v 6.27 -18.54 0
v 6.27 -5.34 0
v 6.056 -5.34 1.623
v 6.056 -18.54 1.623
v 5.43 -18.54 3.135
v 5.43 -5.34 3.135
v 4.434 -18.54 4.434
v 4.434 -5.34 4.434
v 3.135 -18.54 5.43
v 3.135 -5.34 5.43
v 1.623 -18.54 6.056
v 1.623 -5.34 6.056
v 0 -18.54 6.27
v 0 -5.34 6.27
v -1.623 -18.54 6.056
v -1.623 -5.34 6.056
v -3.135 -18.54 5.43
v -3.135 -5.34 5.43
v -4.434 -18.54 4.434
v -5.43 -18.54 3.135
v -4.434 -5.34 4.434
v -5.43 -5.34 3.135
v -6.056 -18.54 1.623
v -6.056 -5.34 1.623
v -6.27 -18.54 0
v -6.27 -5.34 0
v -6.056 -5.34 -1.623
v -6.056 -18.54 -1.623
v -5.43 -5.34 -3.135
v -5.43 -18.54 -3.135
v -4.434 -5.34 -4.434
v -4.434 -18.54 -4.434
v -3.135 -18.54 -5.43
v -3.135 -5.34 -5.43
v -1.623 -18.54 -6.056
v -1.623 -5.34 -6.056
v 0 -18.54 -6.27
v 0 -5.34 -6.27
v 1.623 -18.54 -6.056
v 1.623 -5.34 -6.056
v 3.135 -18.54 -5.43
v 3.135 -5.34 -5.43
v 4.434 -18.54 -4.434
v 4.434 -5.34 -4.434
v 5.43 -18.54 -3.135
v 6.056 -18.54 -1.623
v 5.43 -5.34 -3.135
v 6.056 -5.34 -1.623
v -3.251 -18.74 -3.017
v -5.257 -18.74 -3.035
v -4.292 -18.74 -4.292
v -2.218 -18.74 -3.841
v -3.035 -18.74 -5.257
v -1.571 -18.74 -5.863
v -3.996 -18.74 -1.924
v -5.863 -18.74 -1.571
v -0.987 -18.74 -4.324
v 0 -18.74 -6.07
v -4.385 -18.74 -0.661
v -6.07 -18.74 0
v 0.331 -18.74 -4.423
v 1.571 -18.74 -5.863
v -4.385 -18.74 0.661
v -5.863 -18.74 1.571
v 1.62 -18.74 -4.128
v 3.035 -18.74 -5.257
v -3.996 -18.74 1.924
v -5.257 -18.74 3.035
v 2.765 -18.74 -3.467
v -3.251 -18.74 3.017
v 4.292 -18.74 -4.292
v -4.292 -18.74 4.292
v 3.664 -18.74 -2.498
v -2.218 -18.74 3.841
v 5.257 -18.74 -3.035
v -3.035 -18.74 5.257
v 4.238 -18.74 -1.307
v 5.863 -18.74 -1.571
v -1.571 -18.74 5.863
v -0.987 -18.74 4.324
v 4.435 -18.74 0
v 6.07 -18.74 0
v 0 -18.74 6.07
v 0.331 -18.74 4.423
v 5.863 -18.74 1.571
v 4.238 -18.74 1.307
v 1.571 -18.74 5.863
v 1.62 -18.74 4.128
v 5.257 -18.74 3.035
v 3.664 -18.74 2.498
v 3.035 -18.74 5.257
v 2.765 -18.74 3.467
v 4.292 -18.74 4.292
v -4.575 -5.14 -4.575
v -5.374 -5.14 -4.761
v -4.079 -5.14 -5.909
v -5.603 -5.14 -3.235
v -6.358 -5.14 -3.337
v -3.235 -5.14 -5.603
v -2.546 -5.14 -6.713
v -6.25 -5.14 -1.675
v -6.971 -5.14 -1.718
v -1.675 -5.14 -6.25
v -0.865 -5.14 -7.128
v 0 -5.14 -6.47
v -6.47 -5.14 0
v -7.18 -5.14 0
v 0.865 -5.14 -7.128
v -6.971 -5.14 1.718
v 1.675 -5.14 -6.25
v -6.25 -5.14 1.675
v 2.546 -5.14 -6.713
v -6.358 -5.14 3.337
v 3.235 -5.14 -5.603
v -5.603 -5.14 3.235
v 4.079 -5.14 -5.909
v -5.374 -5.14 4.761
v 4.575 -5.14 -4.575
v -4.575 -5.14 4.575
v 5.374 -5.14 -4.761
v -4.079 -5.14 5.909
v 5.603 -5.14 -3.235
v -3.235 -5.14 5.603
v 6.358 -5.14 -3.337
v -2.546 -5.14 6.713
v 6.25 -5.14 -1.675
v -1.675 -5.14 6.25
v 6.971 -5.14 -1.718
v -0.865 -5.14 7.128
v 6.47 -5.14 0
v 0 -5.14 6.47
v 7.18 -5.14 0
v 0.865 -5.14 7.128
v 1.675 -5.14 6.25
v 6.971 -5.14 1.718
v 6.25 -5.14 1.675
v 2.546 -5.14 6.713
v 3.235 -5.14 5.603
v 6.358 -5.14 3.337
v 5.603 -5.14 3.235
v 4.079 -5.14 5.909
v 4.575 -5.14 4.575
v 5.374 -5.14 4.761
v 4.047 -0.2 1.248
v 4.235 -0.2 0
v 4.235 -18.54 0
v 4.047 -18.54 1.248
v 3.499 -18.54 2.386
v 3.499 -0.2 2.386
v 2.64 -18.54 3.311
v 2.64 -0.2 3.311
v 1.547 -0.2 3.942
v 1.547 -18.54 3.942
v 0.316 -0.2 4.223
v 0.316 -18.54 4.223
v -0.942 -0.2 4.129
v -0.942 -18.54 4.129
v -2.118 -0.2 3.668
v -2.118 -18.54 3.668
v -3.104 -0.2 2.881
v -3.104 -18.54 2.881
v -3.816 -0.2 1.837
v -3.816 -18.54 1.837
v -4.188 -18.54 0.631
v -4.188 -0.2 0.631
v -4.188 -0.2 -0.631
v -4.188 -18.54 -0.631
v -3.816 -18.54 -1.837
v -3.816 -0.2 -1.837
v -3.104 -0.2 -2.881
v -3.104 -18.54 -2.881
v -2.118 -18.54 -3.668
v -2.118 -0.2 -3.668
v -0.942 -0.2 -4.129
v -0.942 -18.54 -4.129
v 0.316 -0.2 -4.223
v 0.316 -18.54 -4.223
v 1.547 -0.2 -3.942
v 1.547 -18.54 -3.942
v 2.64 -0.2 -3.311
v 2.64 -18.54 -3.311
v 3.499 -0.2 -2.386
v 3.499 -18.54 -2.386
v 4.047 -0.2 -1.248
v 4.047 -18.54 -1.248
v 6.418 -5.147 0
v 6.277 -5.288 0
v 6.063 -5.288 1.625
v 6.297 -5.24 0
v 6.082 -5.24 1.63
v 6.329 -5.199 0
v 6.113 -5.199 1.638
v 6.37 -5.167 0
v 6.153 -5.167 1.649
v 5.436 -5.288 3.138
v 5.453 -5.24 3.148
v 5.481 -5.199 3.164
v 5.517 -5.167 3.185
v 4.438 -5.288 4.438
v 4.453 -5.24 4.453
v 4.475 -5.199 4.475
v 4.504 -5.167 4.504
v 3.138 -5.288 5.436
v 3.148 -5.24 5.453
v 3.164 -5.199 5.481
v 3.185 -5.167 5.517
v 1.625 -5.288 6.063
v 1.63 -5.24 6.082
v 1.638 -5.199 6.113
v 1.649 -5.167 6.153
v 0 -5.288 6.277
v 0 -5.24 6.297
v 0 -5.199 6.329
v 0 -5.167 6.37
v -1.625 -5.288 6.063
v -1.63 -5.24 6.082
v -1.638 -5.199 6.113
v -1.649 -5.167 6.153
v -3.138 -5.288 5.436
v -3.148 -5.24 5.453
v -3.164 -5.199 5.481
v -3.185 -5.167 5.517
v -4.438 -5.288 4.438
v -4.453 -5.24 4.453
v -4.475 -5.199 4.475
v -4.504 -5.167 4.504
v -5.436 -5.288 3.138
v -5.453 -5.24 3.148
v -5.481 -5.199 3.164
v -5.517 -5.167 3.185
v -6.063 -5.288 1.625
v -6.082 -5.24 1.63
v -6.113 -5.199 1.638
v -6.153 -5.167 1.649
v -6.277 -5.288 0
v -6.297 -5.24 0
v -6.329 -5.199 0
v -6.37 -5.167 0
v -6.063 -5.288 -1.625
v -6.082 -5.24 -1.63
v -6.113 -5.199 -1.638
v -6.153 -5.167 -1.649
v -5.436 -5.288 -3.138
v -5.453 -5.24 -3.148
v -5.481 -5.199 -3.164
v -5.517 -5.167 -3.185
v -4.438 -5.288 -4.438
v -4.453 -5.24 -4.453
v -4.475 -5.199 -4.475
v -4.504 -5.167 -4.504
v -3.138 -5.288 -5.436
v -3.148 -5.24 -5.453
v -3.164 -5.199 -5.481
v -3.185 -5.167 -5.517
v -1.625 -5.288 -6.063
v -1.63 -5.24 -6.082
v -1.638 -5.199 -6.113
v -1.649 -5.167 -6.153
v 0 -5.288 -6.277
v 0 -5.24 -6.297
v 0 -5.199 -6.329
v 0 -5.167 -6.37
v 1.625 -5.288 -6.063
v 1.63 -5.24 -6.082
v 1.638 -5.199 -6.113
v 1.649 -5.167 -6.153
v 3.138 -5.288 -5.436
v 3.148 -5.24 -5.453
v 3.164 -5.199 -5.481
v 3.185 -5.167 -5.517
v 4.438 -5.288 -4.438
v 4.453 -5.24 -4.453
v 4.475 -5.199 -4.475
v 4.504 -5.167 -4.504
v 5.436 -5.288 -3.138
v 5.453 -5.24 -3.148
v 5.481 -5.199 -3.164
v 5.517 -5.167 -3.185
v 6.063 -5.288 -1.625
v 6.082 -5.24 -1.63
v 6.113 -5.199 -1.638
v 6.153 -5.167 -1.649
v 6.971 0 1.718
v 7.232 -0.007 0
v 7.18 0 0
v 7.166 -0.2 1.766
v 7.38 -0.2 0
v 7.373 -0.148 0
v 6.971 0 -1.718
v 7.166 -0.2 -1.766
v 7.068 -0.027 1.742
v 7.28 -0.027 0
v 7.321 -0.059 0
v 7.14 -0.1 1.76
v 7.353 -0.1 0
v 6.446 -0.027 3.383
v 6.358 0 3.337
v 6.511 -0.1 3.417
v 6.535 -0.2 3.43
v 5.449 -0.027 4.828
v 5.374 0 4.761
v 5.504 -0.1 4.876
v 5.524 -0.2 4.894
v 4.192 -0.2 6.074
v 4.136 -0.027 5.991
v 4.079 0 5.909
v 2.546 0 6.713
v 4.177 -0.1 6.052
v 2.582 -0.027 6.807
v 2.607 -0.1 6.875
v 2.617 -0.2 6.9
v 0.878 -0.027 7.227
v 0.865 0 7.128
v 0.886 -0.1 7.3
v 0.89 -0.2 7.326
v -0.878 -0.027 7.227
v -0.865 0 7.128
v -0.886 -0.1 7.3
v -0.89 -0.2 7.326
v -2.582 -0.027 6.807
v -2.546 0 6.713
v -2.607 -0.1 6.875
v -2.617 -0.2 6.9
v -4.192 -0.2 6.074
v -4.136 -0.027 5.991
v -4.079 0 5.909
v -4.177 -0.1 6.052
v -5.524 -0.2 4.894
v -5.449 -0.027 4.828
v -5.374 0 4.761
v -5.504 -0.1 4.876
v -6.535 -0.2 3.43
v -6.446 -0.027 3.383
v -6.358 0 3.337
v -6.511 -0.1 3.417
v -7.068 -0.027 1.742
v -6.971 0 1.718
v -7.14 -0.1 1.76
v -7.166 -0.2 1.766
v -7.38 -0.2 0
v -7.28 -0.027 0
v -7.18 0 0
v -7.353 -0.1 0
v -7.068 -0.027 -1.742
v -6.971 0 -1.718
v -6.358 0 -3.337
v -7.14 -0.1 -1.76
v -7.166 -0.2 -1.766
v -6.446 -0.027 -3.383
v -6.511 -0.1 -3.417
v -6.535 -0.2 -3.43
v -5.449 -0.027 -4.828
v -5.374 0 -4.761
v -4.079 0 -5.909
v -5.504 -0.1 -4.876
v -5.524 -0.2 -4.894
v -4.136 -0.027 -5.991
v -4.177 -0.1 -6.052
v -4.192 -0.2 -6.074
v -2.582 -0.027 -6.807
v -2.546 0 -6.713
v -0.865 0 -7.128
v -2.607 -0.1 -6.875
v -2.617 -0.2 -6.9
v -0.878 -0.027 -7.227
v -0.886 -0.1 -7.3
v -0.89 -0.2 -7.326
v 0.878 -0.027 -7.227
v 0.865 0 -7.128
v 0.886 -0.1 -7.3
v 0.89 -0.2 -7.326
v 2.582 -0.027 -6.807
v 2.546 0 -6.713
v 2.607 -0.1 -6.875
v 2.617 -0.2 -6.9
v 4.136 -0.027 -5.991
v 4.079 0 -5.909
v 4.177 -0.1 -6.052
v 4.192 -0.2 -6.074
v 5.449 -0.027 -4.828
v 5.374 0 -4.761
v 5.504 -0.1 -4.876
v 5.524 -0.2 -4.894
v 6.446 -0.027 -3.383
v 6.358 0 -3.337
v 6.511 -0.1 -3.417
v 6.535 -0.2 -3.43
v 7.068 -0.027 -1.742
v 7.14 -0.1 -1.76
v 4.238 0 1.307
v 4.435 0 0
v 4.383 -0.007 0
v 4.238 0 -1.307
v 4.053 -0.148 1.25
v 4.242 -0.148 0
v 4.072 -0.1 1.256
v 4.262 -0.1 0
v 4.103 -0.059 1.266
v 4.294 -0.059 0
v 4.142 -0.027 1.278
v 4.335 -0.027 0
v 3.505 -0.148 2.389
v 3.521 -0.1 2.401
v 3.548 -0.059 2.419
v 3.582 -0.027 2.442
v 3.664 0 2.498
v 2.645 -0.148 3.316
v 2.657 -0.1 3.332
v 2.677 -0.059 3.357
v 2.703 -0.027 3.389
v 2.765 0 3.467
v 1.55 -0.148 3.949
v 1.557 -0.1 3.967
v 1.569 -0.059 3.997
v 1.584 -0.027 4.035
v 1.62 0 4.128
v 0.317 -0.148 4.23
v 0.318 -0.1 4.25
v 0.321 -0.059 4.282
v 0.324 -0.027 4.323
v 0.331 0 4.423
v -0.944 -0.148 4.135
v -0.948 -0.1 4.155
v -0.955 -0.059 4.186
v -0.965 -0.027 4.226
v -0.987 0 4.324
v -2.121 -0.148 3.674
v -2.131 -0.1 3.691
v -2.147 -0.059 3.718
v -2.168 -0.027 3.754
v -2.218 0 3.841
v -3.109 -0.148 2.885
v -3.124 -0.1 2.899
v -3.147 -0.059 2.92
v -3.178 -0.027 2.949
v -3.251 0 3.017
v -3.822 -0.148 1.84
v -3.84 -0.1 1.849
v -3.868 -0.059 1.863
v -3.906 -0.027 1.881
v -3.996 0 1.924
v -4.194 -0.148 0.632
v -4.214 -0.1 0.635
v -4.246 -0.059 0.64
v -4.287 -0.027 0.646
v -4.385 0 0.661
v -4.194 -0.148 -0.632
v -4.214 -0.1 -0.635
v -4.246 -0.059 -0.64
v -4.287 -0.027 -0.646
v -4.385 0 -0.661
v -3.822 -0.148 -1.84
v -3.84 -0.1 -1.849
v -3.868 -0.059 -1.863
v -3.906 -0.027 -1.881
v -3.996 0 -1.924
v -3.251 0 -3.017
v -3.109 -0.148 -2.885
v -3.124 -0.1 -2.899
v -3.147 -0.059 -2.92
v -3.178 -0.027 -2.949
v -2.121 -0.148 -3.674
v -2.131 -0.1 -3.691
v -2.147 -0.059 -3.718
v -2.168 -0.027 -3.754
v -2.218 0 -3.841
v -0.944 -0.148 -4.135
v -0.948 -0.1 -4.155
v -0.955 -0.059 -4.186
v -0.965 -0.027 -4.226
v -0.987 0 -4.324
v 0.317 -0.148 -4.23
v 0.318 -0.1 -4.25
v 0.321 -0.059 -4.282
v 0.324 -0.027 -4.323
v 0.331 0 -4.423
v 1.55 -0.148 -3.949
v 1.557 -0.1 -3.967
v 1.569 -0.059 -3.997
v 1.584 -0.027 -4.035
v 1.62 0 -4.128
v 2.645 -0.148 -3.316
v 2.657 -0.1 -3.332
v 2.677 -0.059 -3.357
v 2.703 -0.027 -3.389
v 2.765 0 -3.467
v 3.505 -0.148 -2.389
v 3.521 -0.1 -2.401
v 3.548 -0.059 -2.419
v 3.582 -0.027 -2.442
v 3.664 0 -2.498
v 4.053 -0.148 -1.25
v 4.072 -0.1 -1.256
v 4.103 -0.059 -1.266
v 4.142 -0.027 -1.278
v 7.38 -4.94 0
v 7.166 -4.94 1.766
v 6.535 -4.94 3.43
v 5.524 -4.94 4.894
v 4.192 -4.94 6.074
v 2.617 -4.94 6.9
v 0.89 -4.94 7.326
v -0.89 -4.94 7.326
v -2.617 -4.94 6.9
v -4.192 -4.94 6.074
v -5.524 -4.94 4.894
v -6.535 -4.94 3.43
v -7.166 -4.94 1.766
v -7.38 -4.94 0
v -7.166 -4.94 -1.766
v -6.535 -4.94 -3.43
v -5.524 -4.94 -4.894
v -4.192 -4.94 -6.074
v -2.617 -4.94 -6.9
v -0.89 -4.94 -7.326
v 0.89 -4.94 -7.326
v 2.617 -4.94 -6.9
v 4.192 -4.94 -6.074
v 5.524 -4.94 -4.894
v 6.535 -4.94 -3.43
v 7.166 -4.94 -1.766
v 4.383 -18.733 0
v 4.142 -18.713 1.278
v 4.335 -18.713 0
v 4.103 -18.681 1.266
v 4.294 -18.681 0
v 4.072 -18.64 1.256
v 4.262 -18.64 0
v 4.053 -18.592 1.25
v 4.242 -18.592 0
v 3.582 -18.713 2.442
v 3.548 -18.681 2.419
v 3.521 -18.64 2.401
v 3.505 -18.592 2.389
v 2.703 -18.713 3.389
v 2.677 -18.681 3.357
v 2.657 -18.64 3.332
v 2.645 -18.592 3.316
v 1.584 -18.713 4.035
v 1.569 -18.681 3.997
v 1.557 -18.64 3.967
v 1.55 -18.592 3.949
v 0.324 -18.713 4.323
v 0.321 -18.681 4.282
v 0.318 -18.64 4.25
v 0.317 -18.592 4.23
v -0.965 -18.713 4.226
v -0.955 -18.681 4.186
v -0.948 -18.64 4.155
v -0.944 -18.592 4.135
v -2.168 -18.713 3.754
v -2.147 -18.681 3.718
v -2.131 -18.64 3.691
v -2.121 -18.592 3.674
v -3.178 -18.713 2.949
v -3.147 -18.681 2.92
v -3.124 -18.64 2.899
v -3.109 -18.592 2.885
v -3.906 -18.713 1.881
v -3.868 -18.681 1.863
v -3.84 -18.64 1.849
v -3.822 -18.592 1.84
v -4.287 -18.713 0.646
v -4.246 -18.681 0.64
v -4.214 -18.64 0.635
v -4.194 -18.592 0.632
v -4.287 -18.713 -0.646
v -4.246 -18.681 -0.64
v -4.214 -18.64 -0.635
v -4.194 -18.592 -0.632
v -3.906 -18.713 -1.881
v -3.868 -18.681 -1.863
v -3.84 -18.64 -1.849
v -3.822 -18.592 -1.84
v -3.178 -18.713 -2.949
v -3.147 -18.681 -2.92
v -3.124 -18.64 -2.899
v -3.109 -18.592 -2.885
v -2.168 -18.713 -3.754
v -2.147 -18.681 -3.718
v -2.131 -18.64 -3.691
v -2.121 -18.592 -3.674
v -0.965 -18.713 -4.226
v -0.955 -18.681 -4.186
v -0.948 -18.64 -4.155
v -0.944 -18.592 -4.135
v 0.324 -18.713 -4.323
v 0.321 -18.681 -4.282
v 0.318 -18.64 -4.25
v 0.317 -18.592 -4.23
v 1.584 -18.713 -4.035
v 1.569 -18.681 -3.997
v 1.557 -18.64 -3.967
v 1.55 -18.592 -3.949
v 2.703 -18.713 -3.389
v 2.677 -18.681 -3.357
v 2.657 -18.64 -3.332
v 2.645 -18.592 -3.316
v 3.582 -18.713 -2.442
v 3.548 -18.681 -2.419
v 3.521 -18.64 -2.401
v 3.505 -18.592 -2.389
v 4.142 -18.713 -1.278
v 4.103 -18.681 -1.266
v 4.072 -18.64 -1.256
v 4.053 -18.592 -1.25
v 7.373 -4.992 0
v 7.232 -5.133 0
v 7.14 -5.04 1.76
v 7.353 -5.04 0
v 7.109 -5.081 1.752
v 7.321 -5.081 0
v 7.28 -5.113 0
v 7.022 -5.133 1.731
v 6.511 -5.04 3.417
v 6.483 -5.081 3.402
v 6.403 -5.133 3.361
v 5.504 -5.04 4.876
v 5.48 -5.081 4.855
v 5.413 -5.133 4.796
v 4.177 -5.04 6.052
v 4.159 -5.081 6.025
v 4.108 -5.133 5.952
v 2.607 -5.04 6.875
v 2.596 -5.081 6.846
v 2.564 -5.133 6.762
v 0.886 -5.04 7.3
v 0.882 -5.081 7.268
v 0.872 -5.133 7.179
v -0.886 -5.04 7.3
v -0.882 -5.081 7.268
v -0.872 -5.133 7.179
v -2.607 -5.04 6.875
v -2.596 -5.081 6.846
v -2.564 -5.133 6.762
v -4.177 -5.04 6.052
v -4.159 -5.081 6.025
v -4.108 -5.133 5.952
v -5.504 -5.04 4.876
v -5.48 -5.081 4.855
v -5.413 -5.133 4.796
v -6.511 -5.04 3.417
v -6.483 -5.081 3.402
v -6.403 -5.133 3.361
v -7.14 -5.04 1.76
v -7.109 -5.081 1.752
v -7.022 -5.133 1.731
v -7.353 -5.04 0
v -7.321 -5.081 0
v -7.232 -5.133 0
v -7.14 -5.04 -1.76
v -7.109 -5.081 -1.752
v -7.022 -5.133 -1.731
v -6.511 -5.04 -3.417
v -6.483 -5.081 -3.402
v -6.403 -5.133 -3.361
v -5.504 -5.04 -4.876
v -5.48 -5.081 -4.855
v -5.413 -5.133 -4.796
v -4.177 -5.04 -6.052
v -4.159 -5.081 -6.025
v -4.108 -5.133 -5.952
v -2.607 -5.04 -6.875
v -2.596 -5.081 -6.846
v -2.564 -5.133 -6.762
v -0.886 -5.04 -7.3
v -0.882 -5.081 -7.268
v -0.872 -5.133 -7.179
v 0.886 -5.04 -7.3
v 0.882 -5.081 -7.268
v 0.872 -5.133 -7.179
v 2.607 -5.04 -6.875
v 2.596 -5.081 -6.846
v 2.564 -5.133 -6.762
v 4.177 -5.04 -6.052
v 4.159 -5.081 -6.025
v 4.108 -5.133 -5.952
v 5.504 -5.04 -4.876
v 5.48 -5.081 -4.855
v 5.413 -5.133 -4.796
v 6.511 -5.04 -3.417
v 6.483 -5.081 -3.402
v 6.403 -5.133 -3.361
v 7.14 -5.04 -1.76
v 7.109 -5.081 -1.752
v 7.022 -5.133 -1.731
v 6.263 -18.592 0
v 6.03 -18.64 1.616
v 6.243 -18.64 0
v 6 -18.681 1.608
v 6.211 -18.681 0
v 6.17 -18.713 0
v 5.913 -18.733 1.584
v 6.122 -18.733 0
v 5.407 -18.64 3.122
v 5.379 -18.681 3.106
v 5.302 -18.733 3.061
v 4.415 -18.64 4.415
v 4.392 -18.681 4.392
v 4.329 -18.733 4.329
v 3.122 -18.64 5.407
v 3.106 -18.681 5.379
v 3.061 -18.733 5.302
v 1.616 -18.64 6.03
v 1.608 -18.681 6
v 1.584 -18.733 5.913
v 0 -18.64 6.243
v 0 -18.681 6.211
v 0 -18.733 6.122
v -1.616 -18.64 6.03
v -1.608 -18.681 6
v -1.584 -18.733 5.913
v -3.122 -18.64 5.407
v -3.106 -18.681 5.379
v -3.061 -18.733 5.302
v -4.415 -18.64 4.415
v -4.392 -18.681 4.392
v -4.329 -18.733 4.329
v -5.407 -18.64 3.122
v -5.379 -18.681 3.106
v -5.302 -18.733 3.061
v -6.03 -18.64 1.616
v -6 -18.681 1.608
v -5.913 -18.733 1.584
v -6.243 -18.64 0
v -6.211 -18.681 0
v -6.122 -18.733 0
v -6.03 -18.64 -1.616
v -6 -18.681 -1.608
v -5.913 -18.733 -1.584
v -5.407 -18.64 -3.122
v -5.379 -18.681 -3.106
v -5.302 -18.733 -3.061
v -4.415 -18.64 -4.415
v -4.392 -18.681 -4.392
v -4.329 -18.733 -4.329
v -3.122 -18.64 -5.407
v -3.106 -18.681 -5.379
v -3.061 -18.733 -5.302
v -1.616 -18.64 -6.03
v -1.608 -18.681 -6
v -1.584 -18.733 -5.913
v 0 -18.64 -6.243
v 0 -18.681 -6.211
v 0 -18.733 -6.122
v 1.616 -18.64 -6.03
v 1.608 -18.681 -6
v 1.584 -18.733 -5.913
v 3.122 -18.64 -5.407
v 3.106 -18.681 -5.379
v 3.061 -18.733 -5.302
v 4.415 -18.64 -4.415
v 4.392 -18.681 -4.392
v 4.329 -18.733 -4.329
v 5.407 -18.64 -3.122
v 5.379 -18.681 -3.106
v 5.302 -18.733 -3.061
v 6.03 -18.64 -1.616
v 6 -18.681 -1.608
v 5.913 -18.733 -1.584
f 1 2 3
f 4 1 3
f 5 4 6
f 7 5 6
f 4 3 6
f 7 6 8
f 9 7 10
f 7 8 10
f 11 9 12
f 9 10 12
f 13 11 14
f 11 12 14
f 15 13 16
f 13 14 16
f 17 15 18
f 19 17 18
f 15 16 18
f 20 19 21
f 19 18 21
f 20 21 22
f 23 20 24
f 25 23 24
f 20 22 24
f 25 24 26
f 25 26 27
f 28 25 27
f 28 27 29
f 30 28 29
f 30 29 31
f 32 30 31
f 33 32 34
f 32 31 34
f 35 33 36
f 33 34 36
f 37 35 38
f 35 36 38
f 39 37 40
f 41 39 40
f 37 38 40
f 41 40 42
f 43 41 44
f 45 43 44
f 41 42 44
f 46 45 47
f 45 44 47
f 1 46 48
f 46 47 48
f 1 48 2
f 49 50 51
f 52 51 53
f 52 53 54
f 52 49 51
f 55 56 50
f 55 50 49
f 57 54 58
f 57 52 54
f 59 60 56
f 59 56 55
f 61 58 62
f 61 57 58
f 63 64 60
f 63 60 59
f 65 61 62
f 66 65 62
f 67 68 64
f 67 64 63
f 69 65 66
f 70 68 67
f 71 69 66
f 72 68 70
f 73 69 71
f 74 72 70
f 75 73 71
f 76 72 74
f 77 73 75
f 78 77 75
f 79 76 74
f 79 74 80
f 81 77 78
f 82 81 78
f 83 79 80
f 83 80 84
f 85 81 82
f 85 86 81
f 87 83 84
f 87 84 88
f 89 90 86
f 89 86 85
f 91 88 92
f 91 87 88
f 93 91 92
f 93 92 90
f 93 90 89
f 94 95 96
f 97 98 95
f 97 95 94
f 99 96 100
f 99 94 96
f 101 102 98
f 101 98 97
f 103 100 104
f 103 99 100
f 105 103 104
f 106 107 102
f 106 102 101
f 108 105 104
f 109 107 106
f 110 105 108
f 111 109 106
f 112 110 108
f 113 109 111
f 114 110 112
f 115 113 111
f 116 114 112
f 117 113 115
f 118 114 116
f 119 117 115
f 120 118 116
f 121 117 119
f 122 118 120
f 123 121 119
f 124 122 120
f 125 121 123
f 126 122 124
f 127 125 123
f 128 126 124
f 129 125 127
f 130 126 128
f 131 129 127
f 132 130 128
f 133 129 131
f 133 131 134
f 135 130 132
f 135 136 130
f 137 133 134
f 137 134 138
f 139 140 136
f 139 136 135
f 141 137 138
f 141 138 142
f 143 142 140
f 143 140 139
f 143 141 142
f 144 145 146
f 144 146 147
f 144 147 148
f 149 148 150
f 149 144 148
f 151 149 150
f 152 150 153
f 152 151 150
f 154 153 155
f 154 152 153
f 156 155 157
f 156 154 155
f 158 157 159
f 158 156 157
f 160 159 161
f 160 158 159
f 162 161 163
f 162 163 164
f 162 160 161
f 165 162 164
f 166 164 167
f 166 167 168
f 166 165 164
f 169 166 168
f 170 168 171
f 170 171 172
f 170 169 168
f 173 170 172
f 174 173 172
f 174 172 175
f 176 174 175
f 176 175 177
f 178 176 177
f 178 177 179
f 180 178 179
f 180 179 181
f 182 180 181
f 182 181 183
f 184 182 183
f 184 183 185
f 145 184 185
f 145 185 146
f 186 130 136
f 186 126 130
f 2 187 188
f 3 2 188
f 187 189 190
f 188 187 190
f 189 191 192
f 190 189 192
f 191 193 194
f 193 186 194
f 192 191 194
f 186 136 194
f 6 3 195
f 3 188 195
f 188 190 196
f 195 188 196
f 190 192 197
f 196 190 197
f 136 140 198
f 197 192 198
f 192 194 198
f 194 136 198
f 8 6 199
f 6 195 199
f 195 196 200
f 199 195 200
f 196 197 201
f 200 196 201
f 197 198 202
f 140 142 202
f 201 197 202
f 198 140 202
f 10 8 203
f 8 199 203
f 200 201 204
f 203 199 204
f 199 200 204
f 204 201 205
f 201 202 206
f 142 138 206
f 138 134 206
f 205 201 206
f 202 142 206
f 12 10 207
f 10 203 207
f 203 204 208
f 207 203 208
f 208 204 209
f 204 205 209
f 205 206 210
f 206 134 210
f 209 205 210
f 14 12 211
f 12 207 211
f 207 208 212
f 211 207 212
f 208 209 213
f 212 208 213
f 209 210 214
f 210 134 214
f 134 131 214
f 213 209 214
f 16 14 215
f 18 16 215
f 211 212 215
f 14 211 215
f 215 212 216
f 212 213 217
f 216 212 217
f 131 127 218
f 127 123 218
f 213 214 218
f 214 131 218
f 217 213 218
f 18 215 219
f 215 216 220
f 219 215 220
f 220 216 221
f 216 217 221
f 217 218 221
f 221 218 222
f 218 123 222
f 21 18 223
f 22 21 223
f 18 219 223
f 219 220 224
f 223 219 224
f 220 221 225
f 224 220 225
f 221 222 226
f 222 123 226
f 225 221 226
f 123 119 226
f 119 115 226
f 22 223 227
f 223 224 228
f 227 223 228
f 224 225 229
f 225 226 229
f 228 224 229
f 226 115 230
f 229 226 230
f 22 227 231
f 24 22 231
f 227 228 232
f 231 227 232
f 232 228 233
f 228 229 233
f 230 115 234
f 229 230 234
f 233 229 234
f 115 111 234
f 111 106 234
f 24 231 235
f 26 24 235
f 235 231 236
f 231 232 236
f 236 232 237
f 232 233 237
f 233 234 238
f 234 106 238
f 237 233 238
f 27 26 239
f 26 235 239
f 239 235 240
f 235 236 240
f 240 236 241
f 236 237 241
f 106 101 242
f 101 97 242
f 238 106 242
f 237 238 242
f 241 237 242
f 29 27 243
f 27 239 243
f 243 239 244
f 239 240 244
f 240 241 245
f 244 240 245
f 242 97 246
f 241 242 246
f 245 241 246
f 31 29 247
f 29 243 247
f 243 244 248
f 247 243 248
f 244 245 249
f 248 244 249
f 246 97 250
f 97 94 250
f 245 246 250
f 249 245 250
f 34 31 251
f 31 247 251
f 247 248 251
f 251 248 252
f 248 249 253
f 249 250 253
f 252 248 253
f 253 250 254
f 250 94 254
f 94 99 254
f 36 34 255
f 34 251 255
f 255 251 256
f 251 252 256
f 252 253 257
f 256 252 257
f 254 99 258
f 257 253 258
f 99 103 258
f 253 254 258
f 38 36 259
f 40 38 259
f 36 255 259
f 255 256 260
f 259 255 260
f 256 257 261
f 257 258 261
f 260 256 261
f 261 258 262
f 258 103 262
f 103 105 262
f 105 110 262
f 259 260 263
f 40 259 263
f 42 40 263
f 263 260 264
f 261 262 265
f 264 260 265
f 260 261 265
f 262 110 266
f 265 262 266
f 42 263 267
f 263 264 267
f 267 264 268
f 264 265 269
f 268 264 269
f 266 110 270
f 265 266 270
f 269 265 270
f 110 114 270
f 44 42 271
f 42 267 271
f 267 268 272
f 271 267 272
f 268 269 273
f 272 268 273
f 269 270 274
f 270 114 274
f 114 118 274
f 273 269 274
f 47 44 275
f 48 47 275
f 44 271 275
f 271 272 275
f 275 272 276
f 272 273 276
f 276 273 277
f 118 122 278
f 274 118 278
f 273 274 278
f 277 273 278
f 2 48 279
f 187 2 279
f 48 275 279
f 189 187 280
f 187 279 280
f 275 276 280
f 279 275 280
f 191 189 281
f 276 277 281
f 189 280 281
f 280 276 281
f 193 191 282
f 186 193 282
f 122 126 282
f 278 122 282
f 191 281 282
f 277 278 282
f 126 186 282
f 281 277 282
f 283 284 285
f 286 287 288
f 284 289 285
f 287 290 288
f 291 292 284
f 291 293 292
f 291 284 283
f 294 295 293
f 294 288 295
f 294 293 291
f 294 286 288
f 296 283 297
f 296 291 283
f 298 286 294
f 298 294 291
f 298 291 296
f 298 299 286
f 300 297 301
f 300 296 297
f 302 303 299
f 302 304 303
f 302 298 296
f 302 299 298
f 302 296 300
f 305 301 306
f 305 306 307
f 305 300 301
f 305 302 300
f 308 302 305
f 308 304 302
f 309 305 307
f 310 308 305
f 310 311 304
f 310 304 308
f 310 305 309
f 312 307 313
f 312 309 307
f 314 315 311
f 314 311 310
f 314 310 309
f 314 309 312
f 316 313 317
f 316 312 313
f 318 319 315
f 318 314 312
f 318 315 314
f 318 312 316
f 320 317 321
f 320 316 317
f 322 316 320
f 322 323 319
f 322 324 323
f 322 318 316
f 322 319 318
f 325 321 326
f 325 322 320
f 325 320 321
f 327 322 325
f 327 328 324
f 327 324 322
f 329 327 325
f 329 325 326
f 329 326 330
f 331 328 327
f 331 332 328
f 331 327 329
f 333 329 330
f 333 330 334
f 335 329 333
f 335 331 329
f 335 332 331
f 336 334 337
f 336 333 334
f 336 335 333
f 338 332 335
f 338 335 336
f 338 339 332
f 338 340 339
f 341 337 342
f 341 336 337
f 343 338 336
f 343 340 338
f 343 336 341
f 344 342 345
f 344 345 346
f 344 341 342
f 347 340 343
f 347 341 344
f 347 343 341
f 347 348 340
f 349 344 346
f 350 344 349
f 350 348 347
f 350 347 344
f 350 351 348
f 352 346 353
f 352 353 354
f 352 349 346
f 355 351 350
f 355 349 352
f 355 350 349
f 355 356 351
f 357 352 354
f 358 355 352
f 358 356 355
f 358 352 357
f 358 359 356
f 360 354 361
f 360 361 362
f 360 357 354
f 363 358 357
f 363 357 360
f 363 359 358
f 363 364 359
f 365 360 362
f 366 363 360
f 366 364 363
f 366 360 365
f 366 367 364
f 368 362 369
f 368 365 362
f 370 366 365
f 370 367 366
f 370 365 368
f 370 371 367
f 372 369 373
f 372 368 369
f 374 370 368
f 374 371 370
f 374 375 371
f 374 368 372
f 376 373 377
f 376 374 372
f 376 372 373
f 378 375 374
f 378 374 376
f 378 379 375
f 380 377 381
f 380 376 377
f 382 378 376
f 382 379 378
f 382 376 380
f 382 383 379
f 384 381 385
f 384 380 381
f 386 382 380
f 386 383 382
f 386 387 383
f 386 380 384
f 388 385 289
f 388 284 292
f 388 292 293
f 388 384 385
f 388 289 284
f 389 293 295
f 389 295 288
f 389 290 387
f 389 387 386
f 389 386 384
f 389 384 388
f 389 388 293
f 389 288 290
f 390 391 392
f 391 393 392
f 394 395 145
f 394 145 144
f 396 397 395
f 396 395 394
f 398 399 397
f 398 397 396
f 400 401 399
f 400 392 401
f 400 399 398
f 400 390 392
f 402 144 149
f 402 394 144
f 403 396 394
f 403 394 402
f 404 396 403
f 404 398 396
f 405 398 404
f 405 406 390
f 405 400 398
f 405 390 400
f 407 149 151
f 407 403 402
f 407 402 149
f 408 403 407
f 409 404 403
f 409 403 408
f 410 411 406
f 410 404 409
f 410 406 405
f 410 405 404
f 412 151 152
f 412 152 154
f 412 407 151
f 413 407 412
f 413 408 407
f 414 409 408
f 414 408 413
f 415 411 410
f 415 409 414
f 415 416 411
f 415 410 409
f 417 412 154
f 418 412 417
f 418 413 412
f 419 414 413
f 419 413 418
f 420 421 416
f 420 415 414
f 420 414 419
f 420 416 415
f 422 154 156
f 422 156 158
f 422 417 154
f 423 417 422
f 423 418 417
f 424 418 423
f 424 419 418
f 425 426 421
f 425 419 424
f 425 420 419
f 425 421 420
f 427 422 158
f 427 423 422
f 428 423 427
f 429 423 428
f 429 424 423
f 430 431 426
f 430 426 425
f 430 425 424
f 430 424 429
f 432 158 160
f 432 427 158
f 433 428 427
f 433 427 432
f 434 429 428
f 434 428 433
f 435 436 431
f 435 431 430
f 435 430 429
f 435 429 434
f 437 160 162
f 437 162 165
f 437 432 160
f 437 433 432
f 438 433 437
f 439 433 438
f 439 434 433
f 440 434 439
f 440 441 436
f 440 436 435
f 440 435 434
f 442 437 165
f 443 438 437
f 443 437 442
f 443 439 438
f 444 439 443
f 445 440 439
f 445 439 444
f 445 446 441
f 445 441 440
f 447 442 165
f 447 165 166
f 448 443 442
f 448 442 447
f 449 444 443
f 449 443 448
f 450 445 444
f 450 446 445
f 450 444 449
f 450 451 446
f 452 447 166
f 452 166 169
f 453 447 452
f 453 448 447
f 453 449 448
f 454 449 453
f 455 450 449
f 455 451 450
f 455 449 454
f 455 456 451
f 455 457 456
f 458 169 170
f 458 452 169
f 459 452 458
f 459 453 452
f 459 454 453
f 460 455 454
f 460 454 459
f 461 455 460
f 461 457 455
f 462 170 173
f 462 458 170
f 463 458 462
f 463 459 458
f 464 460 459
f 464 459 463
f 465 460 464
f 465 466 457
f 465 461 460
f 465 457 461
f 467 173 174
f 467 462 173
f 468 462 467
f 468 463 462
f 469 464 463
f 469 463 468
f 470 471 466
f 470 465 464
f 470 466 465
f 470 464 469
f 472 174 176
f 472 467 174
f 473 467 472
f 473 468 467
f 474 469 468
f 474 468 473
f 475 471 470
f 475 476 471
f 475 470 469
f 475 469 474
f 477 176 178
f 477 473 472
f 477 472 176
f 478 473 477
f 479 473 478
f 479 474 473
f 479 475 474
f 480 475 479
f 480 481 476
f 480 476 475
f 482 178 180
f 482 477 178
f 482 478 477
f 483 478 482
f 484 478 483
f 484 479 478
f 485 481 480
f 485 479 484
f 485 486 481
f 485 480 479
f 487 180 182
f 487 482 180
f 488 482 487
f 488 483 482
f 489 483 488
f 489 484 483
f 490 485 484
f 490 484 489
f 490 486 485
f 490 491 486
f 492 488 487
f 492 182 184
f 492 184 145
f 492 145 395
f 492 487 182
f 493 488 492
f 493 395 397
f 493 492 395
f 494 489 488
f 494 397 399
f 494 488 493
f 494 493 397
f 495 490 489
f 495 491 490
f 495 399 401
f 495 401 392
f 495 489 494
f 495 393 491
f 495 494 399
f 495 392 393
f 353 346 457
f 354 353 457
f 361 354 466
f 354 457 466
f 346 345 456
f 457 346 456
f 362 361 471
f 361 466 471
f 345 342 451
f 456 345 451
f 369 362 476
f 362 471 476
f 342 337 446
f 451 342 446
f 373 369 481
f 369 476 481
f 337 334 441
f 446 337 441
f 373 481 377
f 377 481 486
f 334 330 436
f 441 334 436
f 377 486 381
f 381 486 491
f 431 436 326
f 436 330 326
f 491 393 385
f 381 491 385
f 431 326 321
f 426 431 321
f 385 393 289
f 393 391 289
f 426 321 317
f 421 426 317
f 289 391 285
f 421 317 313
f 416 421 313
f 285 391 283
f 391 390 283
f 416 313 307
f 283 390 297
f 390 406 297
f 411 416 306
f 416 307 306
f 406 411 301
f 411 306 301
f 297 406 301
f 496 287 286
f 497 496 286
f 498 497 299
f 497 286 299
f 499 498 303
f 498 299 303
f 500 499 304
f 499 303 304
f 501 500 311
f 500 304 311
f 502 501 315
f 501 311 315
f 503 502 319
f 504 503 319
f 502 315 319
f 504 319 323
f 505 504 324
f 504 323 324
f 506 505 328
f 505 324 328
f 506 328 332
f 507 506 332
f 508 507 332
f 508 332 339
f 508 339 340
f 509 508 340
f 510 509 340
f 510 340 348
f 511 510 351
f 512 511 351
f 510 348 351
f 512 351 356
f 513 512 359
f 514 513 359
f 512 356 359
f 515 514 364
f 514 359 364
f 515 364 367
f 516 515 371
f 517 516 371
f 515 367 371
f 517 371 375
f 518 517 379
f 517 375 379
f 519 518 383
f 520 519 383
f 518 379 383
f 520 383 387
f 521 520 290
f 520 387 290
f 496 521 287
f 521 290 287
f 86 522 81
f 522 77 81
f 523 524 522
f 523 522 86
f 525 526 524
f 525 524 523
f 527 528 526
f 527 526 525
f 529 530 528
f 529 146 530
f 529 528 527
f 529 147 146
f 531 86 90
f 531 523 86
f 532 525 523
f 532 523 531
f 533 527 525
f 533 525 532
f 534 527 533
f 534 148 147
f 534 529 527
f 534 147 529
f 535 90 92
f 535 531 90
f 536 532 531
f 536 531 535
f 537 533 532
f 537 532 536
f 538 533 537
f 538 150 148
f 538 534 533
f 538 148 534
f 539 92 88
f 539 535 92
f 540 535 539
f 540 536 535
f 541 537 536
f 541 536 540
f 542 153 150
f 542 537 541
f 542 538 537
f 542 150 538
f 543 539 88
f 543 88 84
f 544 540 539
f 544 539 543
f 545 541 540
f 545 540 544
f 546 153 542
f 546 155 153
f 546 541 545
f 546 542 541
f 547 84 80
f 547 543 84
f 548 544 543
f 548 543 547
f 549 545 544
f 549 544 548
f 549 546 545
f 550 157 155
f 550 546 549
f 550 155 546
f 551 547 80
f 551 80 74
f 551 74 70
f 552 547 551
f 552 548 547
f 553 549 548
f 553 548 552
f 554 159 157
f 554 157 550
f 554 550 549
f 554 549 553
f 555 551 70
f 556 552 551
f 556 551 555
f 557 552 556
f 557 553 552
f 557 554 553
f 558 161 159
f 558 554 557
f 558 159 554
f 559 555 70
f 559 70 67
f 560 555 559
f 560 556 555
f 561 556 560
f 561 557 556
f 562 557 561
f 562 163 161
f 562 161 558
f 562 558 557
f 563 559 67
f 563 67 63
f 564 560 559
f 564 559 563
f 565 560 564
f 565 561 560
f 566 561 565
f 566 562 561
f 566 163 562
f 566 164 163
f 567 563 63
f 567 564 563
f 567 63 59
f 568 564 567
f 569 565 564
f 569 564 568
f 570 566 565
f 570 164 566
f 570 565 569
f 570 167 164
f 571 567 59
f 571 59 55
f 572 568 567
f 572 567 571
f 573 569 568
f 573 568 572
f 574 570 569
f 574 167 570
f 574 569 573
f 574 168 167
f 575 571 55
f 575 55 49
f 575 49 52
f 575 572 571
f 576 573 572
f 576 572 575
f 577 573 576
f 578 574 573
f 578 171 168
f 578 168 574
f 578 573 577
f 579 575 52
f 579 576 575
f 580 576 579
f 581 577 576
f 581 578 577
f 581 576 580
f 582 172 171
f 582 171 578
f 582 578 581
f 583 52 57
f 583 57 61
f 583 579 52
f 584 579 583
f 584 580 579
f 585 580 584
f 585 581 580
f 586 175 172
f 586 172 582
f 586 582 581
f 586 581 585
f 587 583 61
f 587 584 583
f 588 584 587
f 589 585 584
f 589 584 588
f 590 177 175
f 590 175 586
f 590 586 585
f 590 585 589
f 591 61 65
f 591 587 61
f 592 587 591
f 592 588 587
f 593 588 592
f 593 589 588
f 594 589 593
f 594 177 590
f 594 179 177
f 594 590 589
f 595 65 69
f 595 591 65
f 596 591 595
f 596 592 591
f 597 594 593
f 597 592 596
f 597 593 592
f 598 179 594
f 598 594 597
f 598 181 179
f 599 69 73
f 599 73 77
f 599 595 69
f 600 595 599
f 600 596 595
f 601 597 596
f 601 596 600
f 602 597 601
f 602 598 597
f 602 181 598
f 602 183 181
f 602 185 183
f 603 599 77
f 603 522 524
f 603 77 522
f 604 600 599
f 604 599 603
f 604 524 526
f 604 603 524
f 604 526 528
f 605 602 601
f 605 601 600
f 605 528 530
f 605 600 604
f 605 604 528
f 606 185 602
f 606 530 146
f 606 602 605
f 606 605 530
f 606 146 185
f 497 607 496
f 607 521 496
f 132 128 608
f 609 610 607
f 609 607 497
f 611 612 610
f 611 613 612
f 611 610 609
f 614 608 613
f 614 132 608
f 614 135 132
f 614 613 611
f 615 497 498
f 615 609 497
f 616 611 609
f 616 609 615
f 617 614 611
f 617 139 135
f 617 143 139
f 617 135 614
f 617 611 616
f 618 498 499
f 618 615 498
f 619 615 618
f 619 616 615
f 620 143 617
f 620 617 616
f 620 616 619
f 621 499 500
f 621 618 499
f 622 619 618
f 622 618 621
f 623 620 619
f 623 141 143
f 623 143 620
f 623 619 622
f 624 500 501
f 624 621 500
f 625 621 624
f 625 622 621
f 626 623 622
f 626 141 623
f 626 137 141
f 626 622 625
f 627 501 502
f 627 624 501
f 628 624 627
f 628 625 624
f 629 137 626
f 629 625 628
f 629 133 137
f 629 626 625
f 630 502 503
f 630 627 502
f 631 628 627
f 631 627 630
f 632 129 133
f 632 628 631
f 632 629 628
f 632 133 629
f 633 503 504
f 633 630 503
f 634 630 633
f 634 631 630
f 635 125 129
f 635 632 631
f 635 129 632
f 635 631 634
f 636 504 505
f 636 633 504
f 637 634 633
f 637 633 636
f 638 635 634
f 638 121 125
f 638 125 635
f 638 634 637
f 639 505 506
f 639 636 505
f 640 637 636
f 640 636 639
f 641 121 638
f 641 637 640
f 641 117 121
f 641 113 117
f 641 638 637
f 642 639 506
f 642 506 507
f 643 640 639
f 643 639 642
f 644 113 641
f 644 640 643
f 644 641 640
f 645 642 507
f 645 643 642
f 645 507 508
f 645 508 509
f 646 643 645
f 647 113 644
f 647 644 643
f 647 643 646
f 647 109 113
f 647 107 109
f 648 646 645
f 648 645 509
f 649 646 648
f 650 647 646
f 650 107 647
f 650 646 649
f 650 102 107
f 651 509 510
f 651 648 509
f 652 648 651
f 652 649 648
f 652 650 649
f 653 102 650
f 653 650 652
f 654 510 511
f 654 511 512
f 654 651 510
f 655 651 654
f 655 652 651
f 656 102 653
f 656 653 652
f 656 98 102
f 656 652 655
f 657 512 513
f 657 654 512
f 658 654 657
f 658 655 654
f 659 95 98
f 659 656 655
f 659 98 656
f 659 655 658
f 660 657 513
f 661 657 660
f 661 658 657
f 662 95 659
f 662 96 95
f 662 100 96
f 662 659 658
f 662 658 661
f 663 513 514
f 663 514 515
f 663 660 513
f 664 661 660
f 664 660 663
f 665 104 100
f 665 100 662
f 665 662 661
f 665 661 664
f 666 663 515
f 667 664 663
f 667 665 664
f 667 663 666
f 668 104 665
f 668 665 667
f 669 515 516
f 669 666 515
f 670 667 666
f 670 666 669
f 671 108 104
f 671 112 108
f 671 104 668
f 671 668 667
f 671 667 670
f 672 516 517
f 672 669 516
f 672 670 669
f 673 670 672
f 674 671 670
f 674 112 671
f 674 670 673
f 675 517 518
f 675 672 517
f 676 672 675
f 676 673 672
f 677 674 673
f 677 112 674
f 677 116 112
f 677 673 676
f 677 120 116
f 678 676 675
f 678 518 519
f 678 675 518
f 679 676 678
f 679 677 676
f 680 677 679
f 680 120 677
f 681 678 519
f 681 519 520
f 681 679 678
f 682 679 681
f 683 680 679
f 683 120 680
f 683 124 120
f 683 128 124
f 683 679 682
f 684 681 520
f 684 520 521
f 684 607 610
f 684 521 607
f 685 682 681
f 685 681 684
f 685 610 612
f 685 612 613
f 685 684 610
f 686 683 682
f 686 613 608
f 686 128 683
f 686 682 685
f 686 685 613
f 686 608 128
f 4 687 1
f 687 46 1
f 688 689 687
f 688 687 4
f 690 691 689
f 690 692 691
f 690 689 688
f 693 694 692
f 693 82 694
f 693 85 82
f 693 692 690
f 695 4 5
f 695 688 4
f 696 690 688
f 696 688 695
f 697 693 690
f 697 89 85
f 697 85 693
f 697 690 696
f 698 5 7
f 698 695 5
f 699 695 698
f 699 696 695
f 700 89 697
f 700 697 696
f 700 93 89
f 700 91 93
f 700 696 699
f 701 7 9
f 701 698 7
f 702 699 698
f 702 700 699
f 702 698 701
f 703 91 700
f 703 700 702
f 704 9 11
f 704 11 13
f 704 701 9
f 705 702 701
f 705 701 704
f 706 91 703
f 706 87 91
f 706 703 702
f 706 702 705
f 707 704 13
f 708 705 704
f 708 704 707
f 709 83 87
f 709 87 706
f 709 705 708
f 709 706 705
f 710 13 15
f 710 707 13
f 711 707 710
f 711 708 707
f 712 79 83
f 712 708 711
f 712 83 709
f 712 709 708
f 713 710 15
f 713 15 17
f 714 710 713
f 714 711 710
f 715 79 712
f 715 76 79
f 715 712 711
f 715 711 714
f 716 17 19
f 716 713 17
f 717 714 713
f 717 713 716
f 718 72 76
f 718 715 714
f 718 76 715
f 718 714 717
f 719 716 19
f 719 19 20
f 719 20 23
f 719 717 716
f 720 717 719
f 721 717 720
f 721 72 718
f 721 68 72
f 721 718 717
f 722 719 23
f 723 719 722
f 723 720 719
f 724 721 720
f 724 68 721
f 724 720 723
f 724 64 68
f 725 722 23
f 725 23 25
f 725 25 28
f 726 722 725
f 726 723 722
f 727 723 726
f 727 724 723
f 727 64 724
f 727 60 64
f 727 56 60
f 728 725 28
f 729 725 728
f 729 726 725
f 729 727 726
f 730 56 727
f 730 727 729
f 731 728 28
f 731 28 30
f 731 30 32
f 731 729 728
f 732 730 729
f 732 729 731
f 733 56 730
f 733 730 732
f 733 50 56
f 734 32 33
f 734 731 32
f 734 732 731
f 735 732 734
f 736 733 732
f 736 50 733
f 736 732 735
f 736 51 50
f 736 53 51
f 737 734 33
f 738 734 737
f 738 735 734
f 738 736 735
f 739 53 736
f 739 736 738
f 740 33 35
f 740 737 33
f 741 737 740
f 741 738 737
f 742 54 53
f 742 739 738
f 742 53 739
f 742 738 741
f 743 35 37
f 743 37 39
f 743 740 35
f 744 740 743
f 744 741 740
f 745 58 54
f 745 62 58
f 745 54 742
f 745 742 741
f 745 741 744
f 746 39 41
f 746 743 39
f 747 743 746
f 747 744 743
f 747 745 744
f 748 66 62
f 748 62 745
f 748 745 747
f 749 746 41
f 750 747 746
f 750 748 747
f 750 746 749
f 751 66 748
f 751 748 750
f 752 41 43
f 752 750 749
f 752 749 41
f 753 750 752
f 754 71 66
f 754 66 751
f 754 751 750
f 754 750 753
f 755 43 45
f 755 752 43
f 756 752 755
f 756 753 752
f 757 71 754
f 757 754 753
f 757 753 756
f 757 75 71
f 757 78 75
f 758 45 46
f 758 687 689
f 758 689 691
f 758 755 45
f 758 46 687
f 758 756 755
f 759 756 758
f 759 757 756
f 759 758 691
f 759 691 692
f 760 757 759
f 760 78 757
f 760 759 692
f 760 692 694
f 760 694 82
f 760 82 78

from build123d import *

# Parameters (mm, degrees)
F0_R     = 7.38
F0_R_2   = 4.235
F1_DEPTH = 5.14
F2_R     = 6.27
F2_R_2   = 4.235
F3_DEPTH = 13.6
F4_R     = 0.2


with BuildPart() as f1:
    # F0 (on Front) → F1 (new body)
    with BuildSketch(Plane.XZ):
        Circle(F0_R)
        Circle(F0_R_2, mode=Mode.SUBTRACT)
    extrude(amount=F1_DEPTH)

    # F2 (on face) → F3 (join)
    with BuildSketch(Plane.XZ.offset(5.14)):
        Circle(F2_R)
        Circle(F2_R_2, mode=Mode.SUBTRACT)
    extrude(amount=F3_DEPTH)

    # F4
    f4_edges = [f1.edges().sort_by_distance(p)[0] for p in [
        (-6.27, -18.74, 0),
        (-7.38, -5.14, 0),
        (-7.38, 0, 0),
        (-4.235, -18.74, 0),
        (-6.27, -5.14, 0),
        (-4.235, 0, 0),
    ]]
    fillet(f4_edges, radius=F4_R)


solid = f1.part
